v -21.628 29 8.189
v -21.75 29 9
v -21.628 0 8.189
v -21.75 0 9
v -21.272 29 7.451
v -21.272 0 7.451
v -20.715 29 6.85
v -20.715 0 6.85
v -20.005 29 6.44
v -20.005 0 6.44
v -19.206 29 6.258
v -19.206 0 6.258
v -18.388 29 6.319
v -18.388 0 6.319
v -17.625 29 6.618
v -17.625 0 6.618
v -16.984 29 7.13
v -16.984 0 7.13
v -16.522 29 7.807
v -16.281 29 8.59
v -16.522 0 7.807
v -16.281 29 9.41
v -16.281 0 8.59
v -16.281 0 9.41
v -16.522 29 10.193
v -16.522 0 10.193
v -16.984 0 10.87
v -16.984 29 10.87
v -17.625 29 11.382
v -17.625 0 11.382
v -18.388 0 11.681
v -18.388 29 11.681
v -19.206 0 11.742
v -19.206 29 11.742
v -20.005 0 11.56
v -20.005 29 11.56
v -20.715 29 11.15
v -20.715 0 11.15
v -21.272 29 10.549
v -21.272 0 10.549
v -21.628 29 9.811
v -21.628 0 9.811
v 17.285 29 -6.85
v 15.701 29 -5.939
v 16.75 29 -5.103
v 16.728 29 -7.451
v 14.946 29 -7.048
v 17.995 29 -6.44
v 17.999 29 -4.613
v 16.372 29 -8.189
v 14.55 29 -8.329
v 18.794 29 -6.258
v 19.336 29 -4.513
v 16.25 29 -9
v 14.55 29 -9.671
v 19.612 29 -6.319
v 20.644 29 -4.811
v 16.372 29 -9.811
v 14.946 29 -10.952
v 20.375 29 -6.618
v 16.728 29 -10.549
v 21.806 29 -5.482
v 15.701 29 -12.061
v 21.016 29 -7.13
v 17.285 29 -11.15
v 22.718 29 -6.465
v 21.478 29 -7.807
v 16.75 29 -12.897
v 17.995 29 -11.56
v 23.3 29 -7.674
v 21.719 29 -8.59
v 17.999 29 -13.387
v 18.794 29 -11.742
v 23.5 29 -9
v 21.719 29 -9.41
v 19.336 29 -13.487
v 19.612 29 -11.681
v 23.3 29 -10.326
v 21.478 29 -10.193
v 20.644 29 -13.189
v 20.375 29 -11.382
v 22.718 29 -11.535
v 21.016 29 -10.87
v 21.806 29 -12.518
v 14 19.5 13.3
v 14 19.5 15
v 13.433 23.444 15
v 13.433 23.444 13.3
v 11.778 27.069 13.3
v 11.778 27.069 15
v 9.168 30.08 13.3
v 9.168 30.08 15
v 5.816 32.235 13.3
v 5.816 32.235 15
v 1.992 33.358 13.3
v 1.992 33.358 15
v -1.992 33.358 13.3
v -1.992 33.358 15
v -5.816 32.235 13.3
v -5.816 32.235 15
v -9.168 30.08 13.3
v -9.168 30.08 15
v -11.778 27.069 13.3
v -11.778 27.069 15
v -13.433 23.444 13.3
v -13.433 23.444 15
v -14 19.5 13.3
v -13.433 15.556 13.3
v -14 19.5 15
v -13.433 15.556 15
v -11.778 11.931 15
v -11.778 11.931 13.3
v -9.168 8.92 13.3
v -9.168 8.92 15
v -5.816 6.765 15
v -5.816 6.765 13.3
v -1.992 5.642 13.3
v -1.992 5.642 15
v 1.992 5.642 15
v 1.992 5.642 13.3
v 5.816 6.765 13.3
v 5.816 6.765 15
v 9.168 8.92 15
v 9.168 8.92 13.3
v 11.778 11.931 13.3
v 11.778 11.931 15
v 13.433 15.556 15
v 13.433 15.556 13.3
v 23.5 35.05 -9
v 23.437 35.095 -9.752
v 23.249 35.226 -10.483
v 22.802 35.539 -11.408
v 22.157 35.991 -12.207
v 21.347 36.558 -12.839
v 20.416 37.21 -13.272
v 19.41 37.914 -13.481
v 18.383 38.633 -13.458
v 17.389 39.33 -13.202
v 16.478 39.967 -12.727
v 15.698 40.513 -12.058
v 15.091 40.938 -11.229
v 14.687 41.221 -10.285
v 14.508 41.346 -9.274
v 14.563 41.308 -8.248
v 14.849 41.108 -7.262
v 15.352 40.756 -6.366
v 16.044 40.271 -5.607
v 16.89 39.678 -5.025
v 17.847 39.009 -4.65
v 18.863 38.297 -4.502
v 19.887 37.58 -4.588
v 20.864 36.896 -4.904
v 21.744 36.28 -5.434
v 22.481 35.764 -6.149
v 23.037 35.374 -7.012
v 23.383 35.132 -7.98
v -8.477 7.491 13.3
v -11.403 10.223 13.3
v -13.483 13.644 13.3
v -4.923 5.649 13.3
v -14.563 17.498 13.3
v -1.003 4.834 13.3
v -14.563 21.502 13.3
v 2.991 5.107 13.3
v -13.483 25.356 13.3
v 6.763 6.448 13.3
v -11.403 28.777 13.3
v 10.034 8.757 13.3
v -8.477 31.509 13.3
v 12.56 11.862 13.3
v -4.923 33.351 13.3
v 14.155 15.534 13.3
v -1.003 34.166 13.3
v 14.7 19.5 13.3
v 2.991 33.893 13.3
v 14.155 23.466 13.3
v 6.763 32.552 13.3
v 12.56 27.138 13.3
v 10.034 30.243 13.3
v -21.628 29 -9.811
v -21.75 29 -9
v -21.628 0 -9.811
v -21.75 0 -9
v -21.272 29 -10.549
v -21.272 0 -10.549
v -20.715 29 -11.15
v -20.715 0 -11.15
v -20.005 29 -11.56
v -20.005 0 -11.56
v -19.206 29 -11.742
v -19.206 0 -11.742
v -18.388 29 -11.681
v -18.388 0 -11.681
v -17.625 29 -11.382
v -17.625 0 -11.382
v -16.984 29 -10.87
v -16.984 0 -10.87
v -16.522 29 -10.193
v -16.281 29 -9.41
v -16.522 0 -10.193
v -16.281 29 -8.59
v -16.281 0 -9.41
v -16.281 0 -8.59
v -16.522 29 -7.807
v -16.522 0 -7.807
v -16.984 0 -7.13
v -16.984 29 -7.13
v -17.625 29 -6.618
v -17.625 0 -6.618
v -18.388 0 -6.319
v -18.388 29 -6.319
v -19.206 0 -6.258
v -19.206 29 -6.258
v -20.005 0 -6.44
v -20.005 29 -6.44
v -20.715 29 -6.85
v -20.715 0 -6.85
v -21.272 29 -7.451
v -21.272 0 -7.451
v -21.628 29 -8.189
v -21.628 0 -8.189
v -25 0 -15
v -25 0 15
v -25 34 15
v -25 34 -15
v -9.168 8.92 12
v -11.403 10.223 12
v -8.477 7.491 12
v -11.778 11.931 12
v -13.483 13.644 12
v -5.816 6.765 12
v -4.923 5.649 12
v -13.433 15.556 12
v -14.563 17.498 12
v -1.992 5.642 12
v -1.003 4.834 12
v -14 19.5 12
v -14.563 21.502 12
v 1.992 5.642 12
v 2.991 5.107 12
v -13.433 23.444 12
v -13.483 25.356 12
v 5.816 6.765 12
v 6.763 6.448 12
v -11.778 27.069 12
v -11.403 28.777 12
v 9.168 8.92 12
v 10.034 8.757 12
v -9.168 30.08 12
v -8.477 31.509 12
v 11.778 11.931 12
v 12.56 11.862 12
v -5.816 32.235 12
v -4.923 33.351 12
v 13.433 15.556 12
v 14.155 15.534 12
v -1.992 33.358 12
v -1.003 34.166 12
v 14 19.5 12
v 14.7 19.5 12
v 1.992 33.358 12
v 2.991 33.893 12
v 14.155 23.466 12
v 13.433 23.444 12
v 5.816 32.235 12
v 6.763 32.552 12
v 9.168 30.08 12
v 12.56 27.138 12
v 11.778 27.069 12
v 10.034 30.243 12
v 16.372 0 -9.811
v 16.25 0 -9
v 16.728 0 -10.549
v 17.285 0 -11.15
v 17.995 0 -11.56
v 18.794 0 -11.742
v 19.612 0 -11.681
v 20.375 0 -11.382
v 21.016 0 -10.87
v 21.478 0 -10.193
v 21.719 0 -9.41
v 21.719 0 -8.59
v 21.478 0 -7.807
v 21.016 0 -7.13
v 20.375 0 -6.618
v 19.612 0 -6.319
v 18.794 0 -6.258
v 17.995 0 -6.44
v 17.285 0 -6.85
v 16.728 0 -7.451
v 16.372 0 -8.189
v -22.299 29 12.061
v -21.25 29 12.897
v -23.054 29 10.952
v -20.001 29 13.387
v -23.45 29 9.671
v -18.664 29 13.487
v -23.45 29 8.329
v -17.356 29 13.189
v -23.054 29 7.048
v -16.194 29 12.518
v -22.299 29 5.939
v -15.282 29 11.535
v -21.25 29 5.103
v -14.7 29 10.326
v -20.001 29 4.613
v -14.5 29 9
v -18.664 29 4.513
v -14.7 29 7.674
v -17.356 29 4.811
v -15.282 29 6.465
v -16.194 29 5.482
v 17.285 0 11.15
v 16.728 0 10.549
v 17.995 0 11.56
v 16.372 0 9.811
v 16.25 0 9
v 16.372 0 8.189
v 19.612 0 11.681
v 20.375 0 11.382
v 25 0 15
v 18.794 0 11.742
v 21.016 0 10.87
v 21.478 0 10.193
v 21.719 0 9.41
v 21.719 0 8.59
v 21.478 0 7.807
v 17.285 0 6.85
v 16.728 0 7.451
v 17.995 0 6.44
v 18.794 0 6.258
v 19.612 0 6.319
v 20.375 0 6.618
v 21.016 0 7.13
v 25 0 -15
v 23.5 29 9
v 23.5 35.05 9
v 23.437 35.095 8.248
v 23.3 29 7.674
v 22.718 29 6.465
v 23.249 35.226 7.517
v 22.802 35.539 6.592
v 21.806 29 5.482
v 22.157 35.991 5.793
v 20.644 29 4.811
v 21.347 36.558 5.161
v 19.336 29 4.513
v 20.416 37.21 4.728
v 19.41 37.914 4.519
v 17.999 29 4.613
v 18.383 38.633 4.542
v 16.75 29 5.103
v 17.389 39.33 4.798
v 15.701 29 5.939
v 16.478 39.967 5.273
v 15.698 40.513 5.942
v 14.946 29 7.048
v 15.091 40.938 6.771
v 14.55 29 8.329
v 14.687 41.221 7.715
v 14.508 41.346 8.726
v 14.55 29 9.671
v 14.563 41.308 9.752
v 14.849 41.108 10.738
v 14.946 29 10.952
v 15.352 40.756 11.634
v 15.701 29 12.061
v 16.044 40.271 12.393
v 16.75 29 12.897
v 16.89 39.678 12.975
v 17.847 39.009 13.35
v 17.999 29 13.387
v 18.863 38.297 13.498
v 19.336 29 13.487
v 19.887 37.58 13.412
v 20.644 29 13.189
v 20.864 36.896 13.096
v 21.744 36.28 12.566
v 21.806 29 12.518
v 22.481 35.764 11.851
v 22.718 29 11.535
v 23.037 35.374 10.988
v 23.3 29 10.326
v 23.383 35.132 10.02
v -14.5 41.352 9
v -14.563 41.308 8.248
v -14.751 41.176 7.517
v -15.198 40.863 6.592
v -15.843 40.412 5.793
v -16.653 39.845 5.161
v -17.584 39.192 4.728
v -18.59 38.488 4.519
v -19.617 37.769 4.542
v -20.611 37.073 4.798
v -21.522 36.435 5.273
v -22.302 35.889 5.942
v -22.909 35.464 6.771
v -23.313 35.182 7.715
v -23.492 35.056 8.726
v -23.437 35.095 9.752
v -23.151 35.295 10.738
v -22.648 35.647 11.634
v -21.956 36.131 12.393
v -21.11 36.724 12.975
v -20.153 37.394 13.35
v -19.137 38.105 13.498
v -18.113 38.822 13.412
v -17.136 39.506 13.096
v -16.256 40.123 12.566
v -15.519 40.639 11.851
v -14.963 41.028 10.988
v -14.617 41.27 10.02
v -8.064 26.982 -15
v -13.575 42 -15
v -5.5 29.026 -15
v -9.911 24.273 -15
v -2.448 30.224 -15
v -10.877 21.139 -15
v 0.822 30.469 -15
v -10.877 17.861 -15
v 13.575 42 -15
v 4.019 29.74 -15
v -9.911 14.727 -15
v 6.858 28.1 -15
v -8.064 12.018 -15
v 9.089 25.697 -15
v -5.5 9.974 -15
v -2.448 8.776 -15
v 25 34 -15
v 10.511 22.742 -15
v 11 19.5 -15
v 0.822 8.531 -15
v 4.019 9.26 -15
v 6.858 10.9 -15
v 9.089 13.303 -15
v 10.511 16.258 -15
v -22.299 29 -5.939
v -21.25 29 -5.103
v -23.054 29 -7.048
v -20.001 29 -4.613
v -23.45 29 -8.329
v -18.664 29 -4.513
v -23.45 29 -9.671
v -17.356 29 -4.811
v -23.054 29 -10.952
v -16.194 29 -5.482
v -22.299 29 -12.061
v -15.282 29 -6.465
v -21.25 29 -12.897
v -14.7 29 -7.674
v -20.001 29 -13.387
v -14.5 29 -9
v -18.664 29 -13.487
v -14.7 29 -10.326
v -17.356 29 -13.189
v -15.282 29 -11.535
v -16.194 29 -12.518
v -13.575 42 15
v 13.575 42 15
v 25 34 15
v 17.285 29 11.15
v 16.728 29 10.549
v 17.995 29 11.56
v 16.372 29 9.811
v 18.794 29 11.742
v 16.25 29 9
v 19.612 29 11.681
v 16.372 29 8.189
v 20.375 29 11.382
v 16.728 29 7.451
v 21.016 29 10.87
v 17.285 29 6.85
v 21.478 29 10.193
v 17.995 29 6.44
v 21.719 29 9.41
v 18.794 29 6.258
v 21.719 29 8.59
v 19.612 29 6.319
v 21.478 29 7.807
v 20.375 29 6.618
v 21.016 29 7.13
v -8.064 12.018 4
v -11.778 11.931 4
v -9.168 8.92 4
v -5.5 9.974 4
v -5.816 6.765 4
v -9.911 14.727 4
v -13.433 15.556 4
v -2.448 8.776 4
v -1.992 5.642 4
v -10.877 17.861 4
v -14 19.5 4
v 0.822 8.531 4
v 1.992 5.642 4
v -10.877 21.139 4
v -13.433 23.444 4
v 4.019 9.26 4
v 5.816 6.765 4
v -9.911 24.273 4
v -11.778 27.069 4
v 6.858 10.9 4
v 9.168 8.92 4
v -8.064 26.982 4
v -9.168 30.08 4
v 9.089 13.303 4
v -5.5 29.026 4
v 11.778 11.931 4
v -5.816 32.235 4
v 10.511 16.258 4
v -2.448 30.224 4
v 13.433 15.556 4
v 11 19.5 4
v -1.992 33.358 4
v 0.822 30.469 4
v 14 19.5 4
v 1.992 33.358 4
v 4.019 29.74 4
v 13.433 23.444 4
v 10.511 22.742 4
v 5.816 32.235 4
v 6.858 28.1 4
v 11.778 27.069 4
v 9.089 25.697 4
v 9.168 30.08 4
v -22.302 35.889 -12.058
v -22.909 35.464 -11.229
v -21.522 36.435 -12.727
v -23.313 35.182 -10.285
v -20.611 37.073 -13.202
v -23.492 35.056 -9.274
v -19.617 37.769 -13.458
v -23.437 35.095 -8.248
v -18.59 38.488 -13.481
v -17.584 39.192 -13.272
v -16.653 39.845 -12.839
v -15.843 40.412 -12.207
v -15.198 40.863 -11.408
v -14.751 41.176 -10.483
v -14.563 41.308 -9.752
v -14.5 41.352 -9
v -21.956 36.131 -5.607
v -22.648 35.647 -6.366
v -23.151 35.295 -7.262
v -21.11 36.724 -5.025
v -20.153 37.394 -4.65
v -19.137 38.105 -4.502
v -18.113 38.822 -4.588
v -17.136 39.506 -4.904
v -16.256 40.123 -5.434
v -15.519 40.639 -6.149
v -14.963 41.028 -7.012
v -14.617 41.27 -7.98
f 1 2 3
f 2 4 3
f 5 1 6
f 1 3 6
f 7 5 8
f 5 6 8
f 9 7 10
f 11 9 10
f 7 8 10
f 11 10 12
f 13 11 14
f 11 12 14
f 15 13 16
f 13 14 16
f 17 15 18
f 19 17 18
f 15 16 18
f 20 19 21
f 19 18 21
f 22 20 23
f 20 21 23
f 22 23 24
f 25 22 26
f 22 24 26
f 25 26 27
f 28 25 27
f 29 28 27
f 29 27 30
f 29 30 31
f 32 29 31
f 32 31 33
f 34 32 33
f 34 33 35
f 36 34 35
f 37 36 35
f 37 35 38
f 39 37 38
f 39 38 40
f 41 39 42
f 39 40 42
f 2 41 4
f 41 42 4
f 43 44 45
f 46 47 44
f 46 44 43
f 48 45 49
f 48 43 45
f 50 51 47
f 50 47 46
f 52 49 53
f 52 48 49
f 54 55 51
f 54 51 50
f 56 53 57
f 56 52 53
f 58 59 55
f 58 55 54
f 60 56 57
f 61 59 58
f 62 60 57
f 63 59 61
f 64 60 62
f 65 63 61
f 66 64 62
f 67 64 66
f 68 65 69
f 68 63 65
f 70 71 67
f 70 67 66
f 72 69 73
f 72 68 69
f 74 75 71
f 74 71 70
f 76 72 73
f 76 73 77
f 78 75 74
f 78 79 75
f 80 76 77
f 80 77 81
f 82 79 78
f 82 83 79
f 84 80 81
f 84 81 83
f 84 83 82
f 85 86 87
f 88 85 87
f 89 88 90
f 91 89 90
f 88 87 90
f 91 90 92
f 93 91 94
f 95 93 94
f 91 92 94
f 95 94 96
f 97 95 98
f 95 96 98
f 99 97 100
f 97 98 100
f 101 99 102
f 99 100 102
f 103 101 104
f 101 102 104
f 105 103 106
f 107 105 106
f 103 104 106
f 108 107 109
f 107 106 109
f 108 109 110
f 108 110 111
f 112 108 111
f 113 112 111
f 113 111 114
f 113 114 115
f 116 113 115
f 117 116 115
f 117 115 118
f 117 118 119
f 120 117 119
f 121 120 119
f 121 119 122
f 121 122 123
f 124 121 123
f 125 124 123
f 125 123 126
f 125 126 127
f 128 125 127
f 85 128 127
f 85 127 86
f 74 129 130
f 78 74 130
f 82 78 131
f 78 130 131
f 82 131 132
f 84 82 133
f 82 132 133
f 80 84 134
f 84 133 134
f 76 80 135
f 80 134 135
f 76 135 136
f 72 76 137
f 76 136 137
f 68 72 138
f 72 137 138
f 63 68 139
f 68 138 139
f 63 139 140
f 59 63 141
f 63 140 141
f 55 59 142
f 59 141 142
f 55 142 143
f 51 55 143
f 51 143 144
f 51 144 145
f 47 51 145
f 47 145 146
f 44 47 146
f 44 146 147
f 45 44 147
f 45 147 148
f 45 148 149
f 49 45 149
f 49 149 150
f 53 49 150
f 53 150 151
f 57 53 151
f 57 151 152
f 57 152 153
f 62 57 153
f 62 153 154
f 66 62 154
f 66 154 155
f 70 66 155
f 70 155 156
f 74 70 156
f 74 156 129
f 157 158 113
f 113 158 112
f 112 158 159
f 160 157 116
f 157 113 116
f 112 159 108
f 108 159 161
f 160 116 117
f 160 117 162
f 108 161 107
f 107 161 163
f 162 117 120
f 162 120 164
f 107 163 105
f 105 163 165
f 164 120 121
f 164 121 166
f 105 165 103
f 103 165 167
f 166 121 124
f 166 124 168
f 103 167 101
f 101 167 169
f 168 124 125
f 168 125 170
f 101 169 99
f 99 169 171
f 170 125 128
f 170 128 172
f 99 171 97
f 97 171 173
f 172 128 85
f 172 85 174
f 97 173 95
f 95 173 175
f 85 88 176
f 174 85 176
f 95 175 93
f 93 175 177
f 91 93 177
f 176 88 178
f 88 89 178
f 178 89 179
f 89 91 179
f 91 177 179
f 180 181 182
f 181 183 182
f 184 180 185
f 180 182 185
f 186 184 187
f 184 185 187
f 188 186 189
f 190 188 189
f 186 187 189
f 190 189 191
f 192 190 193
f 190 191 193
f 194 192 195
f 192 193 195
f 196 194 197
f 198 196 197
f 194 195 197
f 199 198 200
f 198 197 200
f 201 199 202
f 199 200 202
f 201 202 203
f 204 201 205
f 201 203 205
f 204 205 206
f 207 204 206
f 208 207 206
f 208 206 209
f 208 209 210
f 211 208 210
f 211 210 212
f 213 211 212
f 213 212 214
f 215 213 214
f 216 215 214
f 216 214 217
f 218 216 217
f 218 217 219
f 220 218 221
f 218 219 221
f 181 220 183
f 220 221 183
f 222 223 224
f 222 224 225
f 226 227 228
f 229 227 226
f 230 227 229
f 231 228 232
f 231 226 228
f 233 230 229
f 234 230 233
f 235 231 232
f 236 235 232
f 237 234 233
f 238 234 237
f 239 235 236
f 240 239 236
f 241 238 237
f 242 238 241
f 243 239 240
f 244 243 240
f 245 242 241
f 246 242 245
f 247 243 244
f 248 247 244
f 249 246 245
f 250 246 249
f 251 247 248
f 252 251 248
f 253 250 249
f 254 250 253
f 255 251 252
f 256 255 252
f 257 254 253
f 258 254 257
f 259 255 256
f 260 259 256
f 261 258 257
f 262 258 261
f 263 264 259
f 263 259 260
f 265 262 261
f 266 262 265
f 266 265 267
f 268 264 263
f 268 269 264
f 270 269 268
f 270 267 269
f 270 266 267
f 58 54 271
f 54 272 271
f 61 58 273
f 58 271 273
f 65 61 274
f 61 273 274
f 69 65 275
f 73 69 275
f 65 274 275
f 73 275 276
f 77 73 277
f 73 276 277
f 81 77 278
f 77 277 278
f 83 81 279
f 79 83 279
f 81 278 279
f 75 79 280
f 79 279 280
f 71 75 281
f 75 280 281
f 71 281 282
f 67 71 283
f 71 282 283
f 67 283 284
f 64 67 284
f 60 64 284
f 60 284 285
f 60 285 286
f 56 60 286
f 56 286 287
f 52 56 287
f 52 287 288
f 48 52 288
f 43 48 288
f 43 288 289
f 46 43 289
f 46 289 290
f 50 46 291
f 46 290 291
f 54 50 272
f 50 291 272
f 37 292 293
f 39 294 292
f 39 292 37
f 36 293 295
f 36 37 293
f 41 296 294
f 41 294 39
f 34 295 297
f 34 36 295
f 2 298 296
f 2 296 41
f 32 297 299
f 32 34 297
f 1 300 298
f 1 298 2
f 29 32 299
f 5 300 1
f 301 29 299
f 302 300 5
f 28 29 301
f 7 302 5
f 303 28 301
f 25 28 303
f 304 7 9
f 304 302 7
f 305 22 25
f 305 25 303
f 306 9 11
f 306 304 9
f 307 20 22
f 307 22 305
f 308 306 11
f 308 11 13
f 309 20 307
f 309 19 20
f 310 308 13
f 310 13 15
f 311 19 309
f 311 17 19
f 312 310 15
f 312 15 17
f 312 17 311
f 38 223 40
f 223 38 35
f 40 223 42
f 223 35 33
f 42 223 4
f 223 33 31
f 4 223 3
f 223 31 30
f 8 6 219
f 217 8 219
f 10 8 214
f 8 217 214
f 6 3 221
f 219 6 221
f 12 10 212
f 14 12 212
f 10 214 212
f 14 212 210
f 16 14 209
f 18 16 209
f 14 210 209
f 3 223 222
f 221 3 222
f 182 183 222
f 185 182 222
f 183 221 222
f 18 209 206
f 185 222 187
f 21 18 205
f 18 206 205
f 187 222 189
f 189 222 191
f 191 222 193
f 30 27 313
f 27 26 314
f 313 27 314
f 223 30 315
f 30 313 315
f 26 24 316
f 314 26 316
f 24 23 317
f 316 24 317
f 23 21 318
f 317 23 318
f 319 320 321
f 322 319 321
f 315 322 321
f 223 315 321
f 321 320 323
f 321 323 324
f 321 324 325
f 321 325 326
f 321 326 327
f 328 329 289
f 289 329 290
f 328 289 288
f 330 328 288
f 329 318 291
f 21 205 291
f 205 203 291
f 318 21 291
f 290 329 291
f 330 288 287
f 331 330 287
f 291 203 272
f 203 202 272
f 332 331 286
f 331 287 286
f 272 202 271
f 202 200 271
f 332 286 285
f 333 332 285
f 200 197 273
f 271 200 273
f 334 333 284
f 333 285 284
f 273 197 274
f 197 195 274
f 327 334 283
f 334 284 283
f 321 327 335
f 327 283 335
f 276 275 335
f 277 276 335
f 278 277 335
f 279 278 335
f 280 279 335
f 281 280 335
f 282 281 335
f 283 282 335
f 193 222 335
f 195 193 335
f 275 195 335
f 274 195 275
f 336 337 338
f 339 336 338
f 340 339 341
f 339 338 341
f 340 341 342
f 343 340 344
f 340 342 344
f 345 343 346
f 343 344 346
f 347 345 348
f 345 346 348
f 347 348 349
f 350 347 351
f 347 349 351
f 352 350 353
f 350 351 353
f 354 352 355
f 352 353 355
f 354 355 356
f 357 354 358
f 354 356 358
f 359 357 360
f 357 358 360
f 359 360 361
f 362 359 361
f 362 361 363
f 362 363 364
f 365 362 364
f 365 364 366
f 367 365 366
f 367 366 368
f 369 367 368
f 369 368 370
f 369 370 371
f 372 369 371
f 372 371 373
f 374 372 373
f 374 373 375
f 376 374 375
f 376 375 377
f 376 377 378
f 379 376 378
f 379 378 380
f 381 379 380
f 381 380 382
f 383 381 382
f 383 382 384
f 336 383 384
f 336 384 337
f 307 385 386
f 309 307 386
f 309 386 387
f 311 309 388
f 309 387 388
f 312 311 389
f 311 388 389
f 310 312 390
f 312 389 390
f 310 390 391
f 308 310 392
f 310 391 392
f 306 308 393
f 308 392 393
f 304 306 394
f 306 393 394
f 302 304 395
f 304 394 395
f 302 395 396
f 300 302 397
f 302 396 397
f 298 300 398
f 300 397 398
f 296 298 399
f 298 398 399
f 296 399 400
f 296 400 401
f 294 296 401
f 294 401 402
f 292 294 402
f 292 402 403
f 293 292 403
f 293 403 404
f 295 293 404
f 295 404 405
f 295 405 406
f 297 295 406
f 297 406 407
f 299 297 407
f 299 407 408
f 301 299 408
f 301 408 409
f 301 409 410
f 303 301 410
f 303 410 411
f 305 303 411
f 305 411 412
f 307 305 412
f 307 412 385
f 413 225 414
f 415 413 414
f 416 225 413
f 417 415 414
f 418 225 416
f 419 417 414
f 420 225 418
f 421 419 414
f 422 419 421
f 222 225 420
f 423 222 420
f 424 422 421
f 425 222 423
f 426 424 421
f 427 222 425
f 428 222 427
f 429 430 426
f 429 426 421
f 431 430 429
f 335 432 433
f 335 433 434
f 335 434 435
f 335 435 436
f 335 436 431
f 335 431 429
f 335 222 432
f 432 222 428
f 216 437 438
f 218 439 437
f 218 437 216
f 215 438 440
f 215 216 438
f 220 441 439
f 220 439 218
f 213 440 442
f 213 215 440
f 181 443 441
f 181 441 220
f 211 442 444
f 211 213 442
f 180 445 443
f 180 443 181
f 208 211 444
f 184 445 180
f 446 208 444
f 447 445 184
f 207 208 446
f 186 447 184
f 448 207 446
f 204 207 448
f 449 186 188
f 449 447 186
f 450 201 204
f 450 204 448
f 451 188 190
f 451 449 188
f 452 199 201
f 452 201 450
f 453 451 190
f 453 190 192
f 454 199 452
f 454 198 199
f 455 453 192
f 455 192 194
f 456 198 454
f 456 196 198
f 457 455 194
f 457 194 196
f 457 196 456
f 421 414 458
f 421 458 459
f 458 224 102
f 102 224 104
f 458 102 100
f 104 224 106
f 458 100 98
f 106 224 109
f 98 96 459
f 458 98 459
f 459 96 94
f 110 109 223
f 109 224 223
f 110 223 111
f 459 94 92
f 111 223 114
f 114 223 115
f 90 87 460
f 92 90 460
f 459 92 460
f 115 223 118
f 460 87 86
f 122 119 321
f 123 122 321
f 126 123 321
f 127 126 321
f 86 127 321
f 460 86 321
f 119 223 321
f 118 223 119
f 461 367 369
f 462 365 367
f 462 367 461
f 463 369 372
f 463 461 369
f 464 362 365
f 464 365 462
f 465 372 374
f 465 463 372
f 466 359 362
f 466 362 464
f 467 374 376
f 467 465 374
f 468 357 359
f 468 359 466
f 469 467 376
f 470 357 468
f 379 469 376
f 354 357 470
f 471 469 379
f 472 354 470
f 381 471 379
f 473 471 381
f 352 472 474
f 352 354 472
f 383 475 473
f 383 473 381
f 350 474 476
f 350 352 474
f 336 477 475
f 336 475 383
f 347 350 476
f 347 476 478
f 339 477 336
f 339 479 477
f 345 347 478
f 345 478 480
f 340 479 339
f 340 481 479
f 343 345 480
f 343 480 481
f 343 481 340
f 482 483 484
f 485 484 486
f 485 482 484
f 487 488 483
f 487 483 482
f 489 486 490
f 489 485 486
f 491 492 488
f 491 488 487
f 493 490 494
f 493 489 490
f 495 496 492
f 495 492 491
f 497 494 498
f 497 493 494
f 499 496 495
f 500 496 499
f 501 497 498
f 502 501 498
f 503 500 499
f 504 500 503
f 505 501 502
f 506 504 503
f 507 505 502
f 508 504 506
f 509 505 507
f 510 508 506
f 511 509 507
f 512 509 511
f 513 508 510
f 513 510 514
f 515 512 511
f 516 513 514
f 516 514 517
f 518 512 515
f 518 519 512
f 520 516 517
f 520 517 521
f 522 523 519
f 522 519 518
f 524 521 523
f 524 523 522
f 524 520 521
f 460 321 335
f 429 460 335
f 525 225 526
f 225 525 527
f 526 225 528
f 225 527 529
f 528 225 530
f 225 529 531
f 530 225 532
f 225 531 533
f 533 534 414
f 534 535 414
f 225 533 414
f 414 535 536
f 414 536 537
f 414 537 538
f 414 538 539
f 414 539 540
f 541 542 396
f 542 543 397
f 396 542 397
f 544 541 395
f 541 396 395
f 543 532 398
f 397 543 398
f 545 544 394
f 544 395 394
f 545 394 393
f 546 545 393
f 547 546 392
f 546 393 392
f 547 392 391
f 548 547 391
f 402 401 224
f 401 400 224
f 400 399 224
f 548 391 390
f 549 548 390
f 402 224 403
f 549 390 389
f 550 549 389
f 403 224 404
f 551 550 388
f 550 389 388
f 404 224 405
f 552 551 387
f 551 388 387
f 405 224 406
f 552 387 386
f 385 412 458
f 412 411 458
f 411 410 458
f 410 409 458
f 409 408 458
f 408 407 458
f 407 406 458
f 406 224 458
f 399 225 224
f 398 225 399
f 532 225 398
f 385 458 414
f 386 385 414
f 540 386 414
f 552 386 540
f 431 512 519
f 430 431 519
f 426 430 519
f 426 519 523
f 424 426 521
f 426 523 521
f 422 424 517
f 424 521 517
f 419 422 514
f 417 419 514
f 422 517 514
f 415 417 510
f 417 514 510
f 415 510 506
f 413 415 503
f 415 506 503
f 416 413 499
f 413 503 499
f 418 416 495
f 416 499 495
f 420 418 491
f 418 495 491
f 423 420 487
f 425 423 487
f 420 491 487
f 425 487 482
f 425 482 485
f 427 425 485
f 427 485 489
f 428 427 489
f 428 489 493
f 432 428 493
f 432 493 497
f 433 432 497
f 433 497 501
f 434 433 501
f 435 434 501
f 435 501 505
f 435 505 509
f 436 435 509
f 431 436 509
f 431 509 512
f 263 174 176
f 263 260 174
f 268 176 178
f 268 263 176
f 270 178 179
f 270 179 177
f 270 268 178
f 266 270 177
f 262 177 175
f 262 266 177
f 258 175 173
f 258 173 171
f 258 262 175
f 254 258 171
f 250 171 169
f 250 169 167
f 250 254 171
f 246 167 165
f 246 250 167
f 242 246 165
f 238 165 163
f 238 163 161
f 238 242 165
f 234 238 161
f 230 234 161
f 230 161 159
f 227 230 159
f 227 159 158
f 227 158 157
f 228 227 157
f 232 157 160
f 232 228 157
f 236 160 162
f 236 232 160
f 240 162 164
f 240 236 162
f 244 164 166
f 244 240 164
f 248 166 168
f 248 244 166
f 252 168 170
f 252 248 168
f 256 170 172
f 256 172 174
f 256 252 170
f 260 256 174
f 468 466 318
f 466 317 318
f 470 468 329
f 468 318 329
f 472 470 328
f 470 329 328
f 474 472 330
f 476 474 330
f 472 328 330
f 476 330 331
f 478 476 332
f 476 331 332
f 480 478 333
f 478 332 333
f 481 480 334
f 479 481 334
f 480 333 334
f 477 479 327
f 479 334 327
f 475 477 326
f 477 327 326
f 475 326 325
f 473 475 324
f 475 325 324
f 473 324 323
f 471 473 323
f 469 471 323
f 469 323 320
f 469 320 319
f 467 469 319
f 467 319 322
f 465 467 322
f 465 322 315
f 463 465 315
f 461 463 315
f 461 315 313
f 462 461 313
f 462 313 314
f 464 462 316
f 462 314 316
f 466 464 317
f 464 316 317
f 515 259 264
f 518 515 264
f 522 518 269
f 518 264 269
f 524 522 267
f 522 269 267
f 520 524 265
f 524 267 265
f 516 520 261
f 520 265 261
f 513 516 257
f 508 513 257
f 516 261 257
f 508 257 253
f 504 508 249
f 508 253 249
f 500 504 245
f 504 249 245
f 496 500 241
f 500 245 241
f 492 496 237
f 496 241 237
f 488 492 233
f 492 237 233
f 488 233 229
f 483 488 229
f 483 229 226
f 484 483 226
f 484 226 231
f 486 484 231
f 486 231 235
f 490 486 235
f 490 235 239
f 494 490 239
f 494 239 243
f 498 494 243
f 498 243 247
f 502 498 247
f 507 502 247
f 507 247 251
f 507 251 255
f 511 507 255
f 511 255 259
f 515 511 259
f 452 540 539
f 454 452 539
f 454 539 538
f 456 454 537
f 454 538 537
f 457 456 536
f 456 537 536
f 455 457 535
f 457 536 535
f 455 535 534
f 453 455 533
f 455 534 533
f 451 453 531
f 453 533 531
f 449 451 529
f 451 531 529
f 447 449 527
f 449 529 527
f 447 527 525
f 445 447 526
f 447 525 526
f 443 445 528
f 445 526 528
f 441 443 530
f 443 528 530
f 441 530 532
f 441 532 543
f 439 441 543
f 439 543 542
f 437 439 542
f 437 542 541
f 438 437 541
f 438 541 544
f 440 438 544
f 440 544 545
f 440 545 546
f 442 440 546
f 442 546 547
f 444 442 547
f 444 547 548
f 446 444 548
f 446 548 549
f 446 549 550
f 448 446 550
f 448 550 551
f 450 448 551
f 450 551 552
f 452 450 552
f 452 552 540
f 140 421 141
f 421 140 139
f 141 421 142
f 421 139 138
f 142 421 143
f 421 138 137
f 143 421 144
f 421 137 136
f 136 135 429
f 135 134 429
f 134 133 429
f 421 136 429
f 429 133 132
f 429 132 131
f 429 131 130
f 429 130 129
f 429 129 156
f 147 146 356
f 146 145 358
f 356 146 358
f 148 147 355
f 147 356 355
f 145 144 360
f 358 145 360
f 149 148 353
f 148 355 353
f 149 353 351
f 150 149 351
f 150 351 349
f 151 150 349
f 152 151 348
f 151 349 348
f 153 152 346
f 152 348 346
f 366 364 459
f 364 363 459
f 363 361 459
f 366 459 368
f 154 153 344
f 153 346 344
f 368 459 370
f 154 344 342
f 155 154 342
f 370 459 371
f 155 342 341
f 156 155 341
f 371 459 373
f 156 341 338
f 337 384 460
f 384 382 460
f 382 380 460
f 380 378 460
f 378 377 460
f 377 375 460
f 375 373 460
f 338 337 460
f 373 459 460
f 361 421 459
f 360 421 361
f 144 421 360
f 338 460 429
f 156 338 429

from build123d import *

# Parameters (mm, degrees)
SZKIC1_W                                             = 50
SZKIC1_H                                             = 30
DODANIE_WYCI_GNI_CIE1_DEPTH                          = 42
SZKIC3_R                                             = 11
WYTNIJ_WYCI_GNI_CIE2_DEPTH                           = 58.349803836
SZKIC4_R                                             = 14
WYTNIJ_WYCI_GNI_CIE3_DEPTH                           = 11
POG_BIENIE_WALCOWE_POD_M5_WKR_T_DO_CZ_CI_D           = 5.5
POG_BIENIE_WALCOWE_POD_M5_WKR_T_DO_CZ_CI_CBORE_D     = 9
POG_BIENIE_WALCOWE_POD_M5_WKR_T_DO_CZ_CI_CBORE_DEPTH = 13
SZKIC5_W                                             = 1.3
SZKIC5_H                                             = 0.7
WYTNIJ_WYCI_GNI_CIE5_DEPTH                           = 58.349803836


with BuildPart() as part:
    # Szkic1 → Dodanie-wyciągnięcie1 (new body)
    with BuildSketch(Plane(origin=(0, 0, 0), x_dir=(1, 0, 0), z_dir=(0, 1, 0))):
        Rectangle(SZKIC1_W, SZKIC1_H)
    extrude(amount=DODANIE_WYCI_GNI_CIE1_DEPTH)

    # Szkic3 → Wytnij-wyciągnięcie2 (cut, through all)
    with BuildSketch(Plane.XY.offset(15)):
        with Locations((0, 19.5)):
            Circle(SZKIC3_R)
    extrude(amount=-WYTNIJ_WYCI_GNI_CIE2_DEPTH, mode=Mode.SUBTRACT)

    # Szkic4 → Wytnij-wyciągnięcie3 (cut)
    with BuildSketch(Plane.XY.offset(15)):
        with Locations((0, 19.5)):
            Circle(SZKIC4_R)
    extrude(amount=-WYTNIJ_WYCI_GNI_CIE3_DEPTH, mode=Mode.SUBTRACT)

    # Pogłębienie walcowe pod M5 Wkręt do części metalowych z łbem sześciokątnym1 (through all)
    with Locations(Plane(origin=(0, 42, 0), x_dir=(1, 0, 0), z_dir=(0, 1, 0))):
        with Locations((19, 9), (19, -9), (-19, -9), (-19, 9)):
            CounterBoreHole(POG_BIENIE_WALCOWE_POD_M5_WKR_T_DO_CZ_CI_D / 2, POG_BIENIE_WALCOWE_POD_M5_WKR_T_DO_CZ_CI_CBORE_D / 2, POG_BIENIE_WALCOWE_POD_M5_WKR_T_DO_CZ_CI_CBORE_DEPTH)

    # Szkic5 → Wycięcie-obrót1 (revolve, cut)
    with BuildSketch(Plane(origin=(0, 0, 0), x_dir=(0, 0, -1), z_dir=(1, 0, 0)), mode=Mode.PRIVATE) as wyci_cie_obr_t1_sk:
        with Locations((-12.65, 5.15)):
            Rectangle(SZKIC5_W, SZKIC5_H)
    revolve(wyci_cie_obr_t1_sk.sketch.rotate(Axis((0, 19.5, 9.294649117), (0, 0, 1)), 90), axis=Axis((0, 19.5, 9.294649117), (0, 0, 1)), mode=Mode.SUBTRACT)

    # Szkic9 → Wytnij-wyciągnięcie5 (cut, through all)
    with BuildSketch(Plane.XY.offset(15)):
        Polygon((-25, 34), (-13.574815946, 42), (-25, 42), align=None)
        Polygon((25, 42), (13.574815946, 42), (25, 34), align=None)
    extrude(amount=-WYTNIJ_WYCI_GNI_CIE5_DEPTH, mode=Mode.SUBTRACT)


solid = part.part
